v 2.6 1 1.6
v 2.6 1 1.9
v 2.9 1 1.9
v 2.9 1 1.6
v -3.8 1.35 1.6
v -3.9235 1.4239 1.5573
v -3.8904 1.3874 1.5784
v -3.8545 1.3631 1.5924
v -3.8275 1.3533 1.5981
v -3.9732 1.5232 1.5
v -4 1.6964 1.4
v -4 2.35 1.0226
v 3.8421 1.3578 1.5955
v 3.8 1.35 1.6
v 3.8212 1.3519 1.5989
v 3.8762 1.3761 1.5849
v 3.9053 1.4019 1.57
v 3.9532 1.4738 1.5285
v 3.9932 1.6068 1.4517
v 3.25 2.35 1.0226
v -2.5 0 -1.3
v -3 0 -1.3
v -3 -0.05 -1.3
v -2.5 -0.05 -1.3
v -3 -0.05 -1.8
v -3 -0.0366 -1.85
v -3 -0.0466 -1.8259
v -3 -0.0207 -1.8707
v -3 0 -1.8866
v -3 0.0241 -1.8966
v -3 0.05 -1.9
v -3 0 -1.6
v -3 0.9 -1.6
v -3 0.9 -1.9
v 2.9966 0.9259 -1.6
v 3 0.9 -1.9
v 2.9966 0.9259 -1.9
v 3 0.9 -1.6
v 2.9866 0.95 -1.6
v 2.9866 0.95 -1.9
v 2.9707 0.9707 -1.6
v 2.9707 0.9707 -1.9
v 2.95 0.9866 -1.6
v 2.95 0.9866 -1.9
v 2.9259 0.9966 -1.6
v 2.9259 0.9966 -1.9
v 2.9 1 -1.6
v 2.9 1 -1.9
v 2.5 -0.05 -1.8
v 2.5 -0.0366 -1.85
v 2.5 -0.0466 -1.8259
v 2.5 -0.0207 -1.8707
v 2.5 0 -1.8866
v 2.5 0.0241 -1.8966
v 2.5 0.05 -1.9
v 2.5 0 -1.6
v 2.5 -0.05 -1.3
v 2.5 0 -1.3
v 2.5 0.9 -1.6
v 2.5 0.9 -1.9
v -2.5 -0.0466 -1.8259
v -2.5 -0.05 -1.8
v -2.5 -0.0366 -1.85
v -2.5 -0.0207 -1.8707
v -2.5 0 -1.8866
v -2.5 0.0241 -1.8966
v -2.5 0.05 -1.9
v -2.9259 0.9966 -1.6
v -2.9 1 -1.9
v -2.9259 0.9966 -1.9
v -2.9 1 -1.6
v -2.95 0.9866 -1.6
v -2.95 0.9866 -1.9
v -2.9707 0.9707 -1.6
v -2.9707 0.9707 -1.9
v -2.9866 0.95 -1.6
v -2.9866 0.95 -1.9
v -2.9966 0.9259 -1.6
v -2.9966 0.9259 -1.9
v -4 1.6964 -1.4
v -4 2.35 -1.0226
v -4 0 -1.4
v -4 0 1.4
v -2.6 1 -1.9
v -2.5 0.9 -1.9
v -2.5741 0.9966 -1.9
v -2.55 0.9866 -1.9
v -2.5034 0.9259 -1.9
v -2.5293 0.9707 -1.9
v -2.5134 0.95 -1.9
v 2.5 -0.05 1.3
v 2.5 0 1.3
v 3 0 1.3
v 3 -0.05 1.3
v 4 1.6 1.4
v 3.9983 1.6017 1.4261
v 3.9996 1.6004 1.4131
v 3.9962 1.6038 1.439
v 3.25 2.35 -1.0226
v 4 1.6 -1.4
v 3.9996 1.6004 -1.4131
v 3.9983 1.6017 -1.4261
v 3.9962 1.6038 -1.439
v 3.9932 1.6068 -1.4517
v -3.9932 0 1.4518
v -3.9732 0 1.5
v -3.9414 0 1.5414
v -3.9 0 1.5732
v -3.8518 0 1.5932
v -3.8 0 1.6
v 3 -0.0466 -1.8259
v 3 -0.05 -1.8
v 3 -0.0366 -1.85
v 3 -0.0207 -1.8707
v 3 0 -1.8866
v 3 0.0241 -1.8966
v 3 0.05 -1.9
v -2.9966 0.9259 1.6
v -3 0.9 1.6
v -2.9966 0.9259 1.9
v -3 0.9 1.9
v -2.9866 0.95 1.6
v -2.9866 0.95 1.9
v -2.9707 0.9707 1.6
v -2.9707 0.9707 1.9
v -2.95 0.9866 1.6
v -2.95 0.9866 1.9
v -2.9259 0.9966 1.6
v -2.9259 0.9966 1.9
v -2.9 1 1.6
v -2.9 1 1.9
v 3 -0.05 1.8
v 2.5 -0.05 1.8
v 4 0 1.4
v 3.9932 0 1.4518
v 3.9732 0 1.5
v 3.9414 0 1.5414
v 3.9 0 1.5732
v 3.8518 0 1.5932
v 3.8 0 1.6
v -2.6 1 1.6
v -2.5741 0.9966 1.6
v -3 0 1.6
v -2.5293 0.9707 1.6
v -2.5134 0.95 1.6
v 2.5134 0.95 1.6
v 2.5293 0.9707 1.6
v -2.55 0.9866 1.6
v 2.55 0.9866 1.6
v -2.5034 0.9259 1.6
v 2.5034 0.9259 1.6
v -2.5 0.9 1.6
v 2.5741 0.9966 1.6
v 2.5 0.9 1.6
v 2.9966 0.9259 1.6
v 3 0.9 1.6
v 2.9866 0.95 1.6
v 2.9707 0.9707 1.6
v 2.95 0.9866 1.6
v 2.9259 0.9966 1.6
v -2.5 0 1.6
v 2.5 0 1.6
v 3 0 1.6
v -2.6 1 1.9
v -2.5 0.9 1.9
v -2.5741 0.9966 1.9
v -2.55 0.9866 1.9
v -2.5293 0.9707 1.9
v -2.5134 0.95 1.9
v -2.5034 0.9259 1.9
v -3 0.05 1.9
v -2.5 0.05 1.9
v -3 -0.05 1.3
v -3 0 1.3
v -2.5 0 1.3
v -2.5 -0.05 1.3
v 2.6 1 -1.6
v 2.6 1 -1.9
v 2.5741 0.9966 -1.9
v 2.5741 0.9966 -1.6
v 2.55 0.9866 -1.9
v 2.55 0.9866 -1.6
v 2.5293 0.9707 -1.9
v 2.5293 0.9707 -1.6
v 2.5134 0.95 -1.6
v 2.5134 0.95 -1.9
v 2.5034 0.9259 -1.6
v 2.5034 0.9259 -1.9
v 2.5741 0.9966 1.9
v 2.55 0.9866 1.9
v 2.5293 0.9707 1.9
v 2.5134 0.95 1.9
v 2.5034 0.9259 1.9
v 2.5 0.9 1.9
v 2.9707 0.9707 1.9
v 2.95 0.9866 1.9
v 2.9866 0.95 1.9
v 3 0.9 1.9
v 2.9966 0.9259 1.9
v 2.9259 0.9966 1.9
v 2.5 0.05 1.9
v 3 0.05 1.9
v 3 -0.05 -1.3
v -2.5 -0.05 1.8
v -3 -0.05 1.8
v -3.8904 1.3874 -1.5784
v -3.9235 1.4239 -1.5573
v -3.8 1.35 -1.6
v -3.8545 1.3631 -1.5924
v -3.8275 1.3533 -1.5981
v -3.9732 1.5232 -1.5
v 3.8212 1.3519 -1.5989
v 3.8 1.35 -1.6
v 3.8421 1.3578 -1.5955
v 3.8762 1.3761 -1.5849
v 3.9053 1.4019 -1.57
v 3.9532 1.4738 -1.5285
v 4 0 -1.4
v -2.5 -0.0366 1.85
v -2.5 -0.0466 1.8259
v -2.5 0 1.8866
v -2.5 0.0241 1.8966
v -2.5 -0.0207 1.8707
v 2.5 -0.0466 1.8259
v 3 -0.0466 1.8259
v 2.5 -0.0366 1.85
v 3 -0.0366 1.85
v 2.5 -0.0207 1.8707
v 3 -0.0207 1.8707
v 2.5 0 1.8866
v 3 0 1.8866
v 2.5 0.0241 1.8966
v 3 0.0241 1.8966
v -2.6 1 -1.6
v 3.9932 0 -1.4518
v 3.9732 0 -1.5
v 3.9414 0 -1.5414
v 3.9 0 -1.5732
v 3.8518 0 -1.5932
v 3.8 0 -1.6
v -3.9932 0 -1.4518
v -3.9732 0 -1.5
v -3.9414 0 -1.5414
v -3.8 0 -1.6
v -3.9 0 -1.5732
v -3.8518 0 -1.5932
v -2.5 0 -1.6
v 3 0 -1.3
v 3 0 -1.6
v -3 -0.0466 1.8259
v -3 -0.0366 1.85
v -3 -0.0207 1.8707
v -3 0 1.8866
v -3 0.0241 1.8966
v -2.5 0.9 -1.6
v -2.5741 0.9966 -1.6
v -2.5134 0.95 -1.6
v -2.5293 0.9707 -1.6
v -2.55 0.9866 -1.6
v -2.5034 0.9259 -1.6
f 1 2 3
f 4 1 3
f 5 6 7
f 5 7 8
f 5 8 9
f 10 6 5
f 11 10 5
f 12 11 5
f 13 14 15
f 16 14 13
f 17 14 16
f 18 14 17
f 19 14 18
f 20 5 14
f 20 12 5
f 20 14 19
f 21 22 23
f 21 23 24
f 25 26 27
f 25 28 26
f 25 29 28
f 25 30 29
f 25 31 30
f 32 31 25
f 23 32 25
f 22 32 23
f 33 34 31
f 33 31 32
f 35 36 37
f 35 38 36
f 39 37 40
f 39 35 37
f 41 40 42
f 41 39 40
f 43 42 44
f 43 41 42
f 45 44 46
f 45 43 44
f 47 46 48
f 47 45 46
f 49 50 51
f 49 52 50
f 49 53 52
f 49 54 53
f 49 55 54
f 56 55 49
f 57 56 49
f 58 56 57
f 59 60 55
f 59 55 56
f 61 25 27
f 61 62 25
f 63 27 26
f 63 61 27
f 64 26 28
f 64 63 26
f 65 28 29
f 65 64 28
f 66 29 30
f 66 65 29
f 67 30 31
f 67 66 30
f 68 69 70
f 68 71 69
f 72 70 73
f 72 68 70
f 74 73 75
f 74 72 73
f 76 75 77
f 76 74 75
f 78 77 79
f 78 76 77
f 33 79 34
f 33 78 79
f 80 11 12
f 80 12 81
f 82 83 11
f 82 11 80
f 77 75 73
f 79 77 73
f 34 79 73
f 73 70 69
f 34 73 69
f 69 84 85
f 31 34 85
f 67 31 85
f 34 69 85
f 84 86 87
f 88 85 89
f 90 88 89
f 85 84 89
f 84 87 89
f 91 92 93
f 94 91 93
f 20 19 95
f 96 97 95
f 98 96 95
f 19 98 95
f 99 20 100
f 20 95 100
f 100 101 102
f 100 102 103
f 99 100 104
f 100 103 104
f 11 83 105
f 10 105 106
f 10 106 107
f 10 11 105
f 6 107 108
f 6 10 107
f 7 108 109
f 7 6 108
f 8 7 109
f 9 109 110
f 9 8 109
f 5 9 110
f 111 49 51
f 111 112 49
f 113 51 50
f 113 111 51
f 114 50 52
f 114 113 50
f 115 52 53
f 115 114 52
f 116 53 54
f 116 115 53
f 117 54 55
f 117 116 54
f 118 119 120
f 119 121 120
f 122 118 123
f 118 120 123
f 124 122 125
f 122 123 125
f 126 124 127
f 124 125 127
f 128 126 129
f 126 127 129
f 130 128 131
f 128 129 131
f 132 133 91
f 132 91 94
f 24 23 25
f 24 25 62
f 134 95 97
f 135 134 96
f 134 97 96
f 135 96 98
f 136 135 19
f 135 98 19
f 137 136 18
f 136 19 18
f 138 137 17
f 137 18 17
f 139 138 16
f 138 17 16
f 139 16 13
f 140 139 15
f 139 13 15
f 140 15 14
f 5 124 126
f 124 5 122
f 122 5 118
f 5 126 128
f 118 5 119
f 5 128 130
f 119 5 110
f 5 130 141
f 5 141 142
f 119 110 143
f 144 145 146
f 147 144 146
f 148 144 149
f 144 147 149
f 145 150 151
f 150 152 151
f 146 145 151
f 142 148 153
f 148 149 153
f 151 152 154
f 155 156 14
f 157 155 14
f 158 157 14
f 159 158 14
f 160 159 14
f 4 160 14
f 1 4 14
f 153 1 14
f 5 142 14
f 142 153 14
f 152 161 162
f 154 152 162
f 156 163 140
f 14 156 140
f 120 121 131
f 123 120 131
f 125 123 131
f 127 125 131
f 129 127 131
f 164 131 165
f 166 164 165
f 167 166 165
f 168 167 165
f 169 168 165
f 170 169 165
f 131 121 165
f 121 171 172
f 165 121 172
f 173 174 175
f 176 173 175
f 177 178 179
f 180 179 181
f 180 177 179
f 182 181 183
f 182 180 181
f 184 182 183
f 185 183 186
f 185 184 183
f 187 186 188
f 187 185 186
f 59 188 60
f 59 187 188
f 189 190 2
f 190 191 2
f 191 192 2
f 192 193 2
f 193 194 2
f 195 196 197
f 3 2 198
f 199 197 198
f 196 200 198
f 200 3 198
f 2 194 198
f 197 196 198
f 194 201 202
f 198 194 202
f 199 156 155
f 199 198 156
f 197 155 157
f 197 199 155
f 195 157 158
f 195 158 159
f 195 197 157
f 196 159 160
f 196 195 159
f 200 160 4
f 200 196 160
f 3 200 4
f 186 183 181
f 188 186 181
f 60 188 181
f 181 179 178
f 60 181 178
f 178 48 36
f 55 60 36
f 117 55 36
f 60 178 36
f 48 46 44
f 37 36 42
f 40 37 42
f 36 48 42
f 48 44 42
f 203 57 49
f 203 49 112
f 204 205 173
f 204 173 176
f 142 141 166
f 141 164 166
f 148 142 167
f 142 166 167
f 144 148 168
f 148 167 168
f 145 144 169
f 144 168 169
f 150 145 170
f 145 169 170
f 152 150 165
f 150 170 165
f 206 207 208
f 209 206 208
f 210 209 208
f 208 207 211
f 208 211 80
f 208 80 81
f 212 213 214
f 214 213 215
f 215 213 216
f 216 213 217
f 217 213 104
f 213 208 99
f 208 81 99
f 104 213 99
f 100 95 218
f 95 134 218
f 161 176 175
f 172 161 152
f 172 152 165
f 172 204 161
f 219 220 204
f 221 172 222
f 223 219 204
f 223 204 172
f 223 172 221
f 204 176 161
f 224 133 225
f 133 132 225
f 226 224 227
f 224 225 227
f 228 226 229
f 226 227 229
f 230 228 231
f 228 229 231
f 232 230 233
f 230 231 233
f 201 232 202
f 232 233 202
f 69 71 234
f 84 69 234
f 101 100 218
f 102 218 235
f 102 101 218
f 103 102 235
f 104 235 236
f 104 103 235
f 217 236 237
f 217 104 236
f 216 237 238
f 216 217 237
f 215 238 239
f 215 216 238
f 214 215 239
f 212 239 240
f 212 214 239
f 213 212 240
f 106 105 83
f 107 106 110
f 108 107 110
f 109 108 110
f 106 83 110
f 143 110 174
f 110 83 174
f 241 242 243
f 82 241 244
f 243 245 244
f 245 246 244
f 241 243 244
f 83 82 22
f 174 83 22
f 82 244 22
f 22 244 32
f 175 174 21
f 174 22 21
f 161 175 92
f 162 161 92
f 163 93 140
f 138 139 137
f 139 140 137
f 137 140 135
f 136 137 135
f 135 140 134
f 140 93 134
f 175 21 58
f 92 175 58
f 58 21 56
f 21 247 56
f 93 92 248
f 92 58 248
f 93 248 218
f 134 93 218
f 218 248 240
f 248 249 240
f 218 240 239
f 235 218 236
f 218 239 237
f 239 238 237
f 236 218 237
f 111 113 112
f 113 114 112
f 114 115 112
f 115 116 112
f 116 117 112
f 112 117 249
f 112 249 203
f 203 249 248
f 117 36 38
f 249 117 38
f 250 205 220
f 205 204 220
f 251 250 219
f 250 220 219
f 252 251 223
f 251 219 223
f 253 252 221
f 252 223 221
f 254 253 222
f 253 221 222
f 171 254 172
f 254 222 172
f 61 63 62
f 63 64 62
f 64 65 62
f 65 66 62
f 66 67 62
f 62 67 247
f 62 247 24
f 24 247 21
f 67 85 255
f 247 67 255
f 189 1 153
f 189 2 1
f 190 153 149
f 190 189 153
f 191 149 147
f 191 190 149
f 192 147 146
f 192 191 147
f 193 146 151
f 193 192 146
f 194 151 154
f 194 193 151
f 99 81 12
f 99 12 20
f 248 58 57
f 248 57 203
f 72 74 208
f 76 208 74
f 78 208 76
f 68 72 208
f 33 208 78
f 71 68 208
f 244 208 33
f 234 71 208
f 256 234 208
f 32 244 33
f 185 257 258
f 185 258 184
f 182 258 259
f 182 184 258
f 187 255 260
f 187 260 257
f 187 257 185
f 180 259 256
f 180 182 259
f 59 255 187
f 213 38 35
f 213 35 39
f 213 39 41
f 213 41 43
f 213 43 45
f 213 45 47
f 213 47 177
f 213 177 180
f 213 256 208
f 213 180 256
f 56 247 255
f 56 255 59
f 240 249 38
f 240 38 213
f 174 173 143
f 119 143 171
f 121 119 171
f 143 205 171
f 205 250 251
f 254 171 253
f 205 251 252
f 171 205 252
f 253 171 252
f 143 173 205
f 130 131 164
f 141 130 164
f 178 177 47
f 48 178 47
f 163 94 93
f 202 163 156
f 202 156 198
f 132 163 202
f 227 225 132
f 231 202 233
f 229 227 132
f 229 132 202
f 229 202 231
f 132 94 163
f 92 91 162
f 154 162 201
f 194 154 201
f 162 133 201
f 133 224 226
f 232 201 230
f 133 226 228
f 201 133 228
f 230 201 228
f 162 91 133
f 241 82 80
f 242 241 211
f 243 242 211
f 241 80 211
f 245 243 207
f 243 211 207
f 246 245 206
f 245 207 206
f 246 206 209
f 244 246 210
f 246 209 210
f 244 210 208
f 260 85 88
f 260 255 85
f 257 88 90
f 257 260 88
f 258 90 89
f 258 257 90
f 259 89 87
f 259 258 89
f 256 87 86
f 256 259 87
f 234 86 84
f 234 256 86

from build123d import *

# Parameters (mm, degrees)
SKETCH_1_W             = 8
SKETCH_1_H             = 3.2
EXTRUDE_1_DEPTH        = 2.35
SKETCH_2_W             = 0.5
SKETCH_2_H             = 0.6
EXTRUDE_2_DEPTH        = 0.05
EXTRUDE_2_DEPTH_BACK   = 1
FILLET_1_R             = 0.1
CHAMFER_1_SIZE         = 1
CHAMFER_1_SIZE2        = 0.577350269
CHAMFER_1_PART_2_SIZE  = 1
CHAMFER_1_PART_2_SIZE2 = 0.577350269
CHAMFER_2_SIZE         = 0.75
FILLET_2_R             = 0.2


with BuildPart() as part:
    # Эскиз1 → Бобышка-Вытянуть1 (new body)
    with BuildSketch(Plane(origin=(0, 0, 0), x_dir=(1, 0, 0), z_dir=(0, 1, 0))):
        Rectangle(SKETCH_1_W, SKETCH_1_H)
    extrude(amount=EXTRUDE_1_DEPTH)

    # Эскиз2 → Бобышка-Вытянуть2 (add, two sides)
    with BuildSketch(Plane.XZ) as extrude_2_sk:
        with Locations((-2.75, 1.6)):
            Rectangle(SKETCH_2_W, SKETCH_2_H)
        with Locations((2.75, 1.6)):
            Rectangle(SKETCH_2_W, SKETCH_2_H)
        with Locations((2.75, -1.6)):
            Rectangle(SKETCH_2_W, SKETCH_2_H)
        with Locations((-2.75, -1.6)):
            Rectangle(SKETCH_2_W, SKETCH_2_H)
    extrude(amount=EXTRUDE_2_DEPTH)
    extrude(extrude_2_sk.sketch, amount=-EXTRUDE_2_DEPTH_BACK)

    # Скругление1
    fillet_1_edges = [part.edges().sort_by_distance(p)[0] for p in [
        (-2.5, 1, 1.75),
        (-3, 1, 1.75),
        (-2.75, -0.05, 1.9),
        (3, 1, 1.75),
        (2.5, 1, 1.75),
        (2.75, -0.05, 1.9),
        (3, 1, -1.75),
        (2.5, 1, -1.75),
        (2.75, -0.05, -1.9),
        (-3, 1, -1.75),
        (-2.5, 1, -1.75),
        (-2.75, -0.05, -1.9),
    ]]
    fillet(fillet_1_edges, radius=FILLET_1_R)

    # Фаска1
    chamfer_1_edges = [part.edges().sort_by_distance(p)[0] for p in [
        (0, 2.35, 1.6),
    ]]
    chamfer_1_side = [part.faces().sort_by_distance(p)[0] for p in [
        (0, 1.212807949, 1.6),
    ]]
    chamfer(chamfer_1_edges, length=CHAMFER_1_SIZE, length2=CHAMFER_1_SIZE2, reference=chamfer_1_side[0])

    # Фаска1 part 2
    chamfer_1_part_2_edges = [part.edges().sort_by_distance(p)[0] for p in [
        (0, 2.35, -1.6),
    ]]
    chamfer_1_part_2_side = [part.faces().sort_by_distance(p)[0] for p in [
        (0, 1.212807949, -1.6),
    ]]
    chamfer(chamfer_1_part_2_edges, length=CHAMFER_1_PART_2_SIZE, length2=CHAMFER_1_PART_2_SIZE2, reference=chamfer_1_part_2_side[0])

    # Фаска2
    chamfer_2_edges = [part.edges().sort_by_distance(p)[0] for p in [
        (4, 2.35, 0),
    ]]
    chamfer(chamfer_2_edges, length=CHAMFER_2_SIZE)

    # Скругление2
    fillet_2_edges = [part.edges().sort_by_distance(p)[0] for p in [
        (-4, 0.675, 1.6),
        (-4, 0.675, -1.6),
        (4, 0.675, 1.6),
        (4, 0.675, -1.6),
    ]]
    fillet(fillet_2_edges, radius=FILLET_2_R)


solid = part.part
